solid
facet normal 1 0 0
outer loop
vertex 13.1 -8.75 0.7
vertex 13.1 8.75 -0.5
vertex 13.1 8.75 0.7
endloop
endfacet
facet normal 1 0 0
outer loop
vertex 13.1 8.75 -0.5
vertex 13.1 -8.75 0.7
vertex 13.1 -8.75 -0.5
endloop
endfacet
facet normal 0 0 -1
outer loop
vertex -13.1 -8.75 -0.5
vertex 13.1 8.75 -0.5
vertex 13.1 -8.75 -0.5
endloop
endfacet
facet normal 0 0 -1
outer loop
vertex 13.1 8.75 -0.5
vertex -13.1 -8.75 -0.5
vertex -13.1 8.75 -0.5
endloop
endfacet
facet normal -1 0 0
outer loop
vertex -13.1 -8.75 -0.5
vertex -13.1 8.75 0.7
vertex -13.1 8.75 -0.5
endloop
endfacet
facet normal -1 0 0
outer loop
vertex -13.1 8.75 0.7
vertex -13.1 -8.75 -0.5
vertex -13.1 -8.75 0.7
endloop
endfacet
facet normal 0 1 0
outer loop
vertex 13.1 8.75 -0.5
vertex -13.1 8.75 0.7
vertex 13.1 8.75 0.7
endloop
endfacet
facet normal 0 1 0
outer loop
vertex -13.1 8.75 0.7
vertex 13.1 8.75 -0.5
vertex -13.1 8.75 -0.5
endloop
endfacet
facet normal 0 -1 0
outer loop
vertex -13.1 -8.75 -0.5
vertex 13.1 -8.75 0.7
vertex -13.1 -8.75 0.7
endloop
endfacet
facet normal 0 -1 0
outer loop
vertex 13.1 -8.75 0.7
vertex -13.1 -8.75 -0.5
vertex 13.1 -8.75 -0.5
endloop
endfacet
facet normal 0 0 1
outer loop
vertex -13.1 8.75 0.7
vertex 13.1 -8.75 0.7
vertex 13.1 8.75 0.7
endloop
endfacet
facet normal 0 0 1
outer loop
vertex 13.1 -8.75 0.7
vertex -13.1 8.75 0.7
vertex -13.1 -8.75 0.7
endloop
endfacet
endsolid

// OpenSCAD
// Parameters
length = 26.2; //[13.1:52.4:0.1]
width = 17.5; //[8.75:35:0.1]
thickness = 1; //[0.5:2:0.1]
corner_radius = 0; //[0:5:0.1]
overlap = 0.8; //[0.5:2:0.1]

// Battery - complete geometry
module battery() {
  color([0.0, 0.4, 0.2]) { // PCB-like green color
    cube([length, width, thickness], center=true);
  }
}

// Mod - complete geometry
module mod() {
  color([0.1, 0.1, 0.6]) { // Blue color for differentiation
    translate([0, 0, thickness/2 + thickness/2 - overlap])
      cube([length, width, thickness], center=true);
  }
}

// Assembly
module assembly() {
  battery();
  mod();
}

assembly();
